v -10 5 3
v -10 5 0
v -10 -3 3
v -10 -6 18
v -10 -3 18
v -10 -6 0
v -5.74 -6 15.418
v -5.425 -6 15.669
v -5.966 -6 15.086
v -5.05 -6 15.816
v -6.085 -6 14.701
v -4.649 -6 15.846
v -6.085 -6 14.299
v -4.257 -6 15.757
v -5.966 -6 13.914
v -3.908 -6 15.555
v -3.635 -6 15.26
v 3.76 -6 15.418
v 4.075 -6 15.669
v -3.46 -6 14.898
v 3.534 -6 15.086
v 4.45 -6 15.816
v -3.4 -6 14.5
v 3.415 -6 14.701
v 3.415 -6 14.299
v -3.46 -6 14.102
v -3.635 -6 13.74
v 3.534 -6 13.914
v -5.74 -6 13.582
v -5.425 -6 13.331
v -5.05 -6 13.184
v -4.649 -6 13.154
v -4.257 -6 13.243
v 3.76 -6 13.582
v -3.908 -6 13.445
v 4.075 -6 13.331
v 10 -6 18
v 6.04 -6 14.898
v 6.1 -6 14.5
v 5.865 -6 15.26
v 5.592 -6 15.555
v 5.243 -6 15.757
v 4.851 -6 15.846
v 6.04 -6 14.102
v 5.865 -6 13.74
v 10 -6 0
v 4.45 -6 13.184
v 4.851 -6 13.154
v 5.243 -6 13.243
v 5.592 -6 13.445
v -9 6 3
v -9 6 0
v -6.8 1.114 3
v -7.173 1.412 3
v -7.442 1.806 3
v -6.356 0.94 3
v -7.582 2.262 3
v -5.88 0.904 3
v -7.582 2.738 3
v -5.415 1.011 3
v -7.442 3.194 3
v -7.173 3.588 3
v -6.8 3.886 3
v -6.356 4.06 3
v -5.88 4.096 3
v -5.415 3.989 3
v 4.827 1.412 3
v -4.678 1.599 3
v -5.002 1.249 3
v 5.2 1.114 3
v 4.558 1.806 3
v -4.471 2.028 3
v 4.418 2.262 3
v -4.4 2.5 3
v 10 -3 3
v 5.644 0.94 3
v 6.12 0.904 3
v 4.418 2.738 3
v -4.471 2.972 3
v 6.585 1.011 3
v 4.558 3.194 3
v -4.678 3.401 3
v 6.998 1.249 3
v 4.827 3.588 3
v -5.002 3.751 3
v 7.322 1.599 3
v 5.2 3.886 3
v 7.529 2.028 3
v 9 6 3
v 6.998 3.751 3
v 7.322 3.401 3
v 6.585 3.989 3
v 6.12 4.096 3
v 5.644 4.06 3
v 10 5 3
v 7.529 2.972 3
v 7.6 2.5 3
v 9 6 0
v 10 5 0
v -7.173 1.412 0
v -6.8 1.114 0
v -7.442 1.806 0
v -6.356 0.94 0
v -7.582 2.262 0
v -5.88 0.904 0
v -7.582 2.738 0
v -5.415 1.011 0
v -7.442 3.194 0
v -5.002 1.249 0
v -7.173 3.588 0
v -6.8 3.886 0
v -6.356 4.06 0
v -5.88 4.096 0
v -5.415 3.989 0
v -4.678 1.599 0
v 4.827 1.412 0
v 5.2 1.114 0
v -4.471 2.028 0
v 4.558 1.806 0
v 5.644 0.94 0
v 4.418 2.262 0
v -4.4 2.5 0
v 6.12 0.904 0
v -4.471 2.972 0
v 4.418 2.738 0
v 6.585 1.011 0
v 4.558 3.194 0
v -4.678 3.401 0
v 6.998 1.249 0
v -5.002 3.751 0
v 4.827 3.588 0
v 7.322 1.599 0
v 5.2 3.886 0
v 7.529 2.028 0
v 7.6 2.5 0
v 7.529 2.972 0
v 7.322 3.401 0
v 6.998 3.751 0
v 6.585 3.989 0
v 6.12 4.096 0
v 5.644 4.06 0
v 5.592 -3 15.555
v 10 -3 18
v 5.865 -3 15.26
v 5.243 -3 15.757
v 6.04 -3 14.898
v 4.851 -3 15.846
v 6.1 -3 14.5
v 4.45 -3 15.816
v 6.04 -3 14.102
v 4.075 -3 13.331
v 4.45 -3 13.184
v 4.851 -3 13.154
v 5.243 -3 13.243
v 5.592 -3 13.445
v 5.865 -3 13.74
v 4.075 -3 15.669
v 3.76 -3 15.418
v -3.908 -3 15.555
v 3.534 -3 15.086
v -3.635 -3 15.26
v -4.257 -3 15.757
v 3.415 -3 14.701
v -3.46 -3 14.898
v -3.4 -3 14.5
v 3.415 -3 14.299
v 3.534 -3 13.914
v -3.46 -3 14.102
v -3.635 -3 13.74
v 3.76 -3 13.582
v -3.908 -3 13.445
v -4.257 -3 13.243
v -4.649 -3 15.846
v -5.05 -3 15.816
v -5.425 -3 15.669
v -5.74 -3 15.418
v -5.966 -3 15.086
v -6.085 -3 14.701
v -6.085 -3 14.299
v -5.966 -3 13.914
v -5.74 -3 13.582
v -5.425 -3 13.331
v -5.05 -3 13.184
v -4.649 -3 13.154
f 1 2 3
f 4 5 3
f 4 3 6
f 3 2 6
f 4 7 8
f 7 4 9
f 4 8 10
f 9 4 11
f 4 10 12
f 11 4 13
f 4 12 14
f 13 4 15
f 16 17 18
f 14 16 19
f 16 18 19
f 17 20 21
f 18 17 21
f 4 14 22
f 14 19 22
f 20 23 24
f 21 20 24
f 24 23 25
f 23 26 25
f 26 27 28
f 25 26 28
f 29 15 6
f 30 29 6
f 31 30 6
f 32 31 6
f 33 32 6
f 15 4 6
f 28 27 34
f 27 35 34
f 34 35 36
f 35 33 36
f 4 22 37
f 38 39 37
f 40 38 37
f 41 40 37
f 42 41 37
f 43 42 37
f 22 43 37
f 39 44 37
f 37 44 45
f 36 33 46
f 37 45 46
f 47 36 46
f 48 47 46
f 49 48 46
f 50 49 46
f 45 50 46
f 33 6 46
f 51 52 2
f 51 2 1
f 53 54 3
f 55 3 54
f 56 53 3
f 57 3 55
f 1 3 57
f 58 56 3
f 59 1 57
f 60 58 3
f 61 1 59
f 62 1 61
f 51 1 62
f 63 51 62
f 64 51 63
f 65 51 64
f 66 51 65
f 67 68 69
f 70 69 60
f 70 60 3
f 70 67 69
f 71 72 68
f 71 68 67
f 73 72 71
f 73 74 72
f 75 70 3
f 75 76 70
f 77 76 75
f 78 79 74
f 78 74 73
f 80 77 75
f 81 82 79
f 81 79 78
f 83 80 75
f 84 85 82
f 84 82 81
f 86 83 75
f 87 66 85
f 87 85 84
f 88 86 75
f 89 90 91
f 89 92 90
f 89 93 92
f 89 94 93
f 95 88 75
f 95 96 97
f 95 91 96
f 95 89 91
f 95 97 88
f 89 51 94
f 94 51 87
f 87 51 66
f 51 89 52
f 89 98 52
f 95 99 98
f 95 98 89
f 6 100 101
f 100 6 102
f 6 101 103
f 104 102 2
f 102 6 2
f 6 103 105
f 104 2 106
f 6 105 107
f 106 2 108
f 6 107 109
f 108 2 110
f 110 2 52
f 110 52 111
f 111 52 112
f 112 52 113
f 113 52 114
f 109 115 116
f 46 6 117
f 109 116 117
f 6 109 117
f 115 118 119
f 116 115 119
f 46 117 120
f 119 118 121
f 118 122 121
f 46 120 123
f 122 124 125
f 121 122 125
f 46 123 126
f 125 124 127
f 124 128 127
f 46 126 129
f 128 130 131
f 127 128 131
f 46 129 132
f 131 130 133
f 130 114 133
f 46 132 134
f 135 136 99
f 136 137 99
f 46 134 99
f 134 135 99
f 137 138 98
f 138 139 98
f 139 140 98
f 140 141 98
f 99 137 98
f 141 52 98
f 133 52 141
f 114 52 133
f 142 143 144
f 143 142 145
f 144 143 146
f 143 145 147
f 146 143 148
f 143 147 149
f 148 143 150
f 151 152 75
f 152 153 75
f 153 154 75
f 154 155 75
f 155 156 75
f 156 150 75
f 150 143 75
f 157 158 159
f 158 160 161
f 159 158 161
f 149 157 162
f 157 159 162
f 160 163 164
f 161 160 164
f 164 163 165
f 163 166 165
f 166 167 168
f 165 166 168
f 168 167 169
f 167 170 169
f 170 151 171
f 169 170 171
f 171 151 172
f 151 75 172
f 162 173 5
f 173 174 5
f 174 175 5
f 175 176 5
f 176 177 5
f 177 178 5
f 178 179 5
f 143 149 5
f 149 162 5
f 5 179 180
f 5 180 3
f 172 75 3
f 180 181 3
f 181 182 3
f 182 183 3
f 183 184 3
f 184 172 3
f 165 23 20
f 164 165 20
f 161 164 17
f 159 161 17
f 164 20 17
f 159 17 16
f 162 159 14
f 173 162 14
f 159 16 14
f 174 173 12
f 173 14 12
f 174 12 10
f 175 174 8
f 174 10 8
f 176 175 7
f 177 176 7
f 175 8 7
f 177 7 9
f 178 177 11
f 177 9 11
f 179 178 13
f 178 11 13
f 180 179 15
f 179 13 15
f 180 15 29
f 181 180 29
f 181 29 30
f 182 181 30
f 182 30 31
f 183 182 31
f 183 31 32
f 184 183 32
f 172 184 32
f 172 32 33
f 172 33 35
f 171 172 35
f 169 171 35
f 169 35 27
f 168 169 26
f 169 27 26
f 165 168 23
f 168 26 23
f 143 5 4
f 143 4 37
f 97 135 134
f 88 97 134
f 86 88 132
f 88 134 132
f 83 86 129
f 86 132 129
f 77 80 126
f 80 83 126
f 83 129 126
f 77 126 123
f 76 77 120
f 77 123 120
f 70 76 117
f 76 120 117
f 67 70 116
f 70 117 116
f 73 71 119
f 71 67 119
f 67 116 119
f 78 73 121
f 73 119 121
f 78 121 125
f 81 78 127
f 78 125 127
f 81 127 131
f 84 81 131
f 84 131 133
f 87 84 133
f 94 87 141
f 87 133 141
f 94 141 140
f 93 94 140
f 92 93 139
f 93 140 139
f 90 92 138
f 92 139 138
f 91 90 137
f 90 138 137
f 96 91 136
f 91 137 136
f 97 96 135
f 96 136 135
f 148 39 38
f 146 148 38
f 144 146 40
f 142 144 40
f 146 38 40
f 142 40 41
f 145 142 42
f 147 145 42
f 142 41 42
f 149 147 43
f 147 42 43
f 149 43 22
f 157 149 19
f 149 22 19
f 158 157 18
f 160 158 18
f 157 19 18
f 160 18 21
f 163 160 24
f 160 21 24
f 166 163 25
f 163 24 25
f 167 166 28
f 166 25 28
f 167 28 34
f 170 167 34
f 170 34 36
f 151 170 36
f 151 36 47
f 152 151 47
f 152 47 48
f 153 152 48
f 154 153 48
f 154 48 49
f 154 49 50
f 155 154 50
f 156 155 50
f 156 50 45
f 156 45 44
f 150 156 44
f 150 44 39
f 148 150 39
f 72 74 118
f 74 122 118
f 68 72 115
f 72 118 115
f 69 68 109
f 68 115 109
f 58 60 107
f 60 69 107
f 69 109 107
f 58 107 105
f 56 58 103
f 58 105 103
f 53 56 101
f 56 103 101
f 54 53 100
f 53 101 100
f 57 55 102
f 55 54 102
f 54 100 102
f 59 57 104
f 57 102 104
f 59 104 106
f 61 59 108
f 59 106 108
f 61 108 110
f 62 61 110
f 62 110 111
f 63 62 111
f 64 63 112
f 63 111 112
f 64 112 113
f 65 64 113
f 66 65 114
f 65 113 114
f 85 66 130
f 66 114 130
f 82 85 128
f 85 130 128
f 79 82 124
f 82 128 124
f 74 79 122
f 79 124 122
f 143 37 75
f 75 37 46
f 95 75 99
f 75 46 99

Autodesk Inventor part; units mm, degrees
ref_plane "YZ Plane" through (0, 0, 0) normal (1, 0, 0) x (0, 1, 0)
ref_plane "XZ Plane" through (0, 0, 0) normal (0, 1, 0) x (-1, 0, 0)
ref_plane "XY Plane" through (0, 0, 0) normal (0, 0, 1) x (1, 0, 0)
sketch "Sketch1" plane through (0, 0, 0) normal (0, 0, 1) x (1, 0, 0)
  line L0 (-10, -6) -> (10, -6)
  line L1 (10, -6) -> (10, 6)
  line L2 (10, 6) -> (-10, 6)
  line L3 (-10, 6) -> (-10, -6)
  circle A0 centre (-6, 2.5) radius 1.6
  circle A1 centre (6, 2.5) radius 1.6
  line L4 (-10, -6) -> (10, -6)
  line L5 (10, -6) -> (10, -3)
  line L6 (10, -3) -> (-10, -3)
  line L7 (-10, -3) -> (-10, -6)
  point P0 (0, 0)
  point P1 (0, 6)
  point P2 (-10, 0)
  dimension "d0" = 12
  dimension "d1" = 20
  dimension "d2" = 3.2
  dimension "d3" = 3.2
  dimension "d4" = 12
  dimension "d5" = 6
  dimension "d6" = 2.5
  dimension "d7" = 3
extrude "Extrusion1" add sketch "Sketch1" along normal blind 3 contours L3 L2 L1 L6
extrude "Extrusion2" add sketch "Sketch1" along normal blind 18 contours L3 L6 L1 L0
sketch "Sketch2" plane through (-10, -6, 0) normal (0, -1, 0) x (1, 0, 0)
  line L0 (20, 0) -> (0, 0) projected
  line L1 (0, 0) -> (0, 18) projected
  line L2 (0, 18) -> (20, 18) projected
  line L3 (20, 18) -> (20, 0) projected
  circle A0 centre (5.25, 14.5) radius 1.35
  circle A1 centre (14.75, 14.5) radius 1.35
  point P0 (10, 0)
  dimension "d13" = 9.5
  dimension "d14" = 5.25
  dimension "d15" = 2.7
  dimension "d16" = 2.7
  dimension "d17" = 3.5
extrude "Extrusion3" cut sketch "Sketch2" against normal up to surface (3 mm away) contours A0 | A1
chamfer "Chamfer1" distance 1 angle 45 2 edges at (10, 6, 1.5) (-10, 6, 1.5)
properties part number "LimitSwitch_TopHolder"
